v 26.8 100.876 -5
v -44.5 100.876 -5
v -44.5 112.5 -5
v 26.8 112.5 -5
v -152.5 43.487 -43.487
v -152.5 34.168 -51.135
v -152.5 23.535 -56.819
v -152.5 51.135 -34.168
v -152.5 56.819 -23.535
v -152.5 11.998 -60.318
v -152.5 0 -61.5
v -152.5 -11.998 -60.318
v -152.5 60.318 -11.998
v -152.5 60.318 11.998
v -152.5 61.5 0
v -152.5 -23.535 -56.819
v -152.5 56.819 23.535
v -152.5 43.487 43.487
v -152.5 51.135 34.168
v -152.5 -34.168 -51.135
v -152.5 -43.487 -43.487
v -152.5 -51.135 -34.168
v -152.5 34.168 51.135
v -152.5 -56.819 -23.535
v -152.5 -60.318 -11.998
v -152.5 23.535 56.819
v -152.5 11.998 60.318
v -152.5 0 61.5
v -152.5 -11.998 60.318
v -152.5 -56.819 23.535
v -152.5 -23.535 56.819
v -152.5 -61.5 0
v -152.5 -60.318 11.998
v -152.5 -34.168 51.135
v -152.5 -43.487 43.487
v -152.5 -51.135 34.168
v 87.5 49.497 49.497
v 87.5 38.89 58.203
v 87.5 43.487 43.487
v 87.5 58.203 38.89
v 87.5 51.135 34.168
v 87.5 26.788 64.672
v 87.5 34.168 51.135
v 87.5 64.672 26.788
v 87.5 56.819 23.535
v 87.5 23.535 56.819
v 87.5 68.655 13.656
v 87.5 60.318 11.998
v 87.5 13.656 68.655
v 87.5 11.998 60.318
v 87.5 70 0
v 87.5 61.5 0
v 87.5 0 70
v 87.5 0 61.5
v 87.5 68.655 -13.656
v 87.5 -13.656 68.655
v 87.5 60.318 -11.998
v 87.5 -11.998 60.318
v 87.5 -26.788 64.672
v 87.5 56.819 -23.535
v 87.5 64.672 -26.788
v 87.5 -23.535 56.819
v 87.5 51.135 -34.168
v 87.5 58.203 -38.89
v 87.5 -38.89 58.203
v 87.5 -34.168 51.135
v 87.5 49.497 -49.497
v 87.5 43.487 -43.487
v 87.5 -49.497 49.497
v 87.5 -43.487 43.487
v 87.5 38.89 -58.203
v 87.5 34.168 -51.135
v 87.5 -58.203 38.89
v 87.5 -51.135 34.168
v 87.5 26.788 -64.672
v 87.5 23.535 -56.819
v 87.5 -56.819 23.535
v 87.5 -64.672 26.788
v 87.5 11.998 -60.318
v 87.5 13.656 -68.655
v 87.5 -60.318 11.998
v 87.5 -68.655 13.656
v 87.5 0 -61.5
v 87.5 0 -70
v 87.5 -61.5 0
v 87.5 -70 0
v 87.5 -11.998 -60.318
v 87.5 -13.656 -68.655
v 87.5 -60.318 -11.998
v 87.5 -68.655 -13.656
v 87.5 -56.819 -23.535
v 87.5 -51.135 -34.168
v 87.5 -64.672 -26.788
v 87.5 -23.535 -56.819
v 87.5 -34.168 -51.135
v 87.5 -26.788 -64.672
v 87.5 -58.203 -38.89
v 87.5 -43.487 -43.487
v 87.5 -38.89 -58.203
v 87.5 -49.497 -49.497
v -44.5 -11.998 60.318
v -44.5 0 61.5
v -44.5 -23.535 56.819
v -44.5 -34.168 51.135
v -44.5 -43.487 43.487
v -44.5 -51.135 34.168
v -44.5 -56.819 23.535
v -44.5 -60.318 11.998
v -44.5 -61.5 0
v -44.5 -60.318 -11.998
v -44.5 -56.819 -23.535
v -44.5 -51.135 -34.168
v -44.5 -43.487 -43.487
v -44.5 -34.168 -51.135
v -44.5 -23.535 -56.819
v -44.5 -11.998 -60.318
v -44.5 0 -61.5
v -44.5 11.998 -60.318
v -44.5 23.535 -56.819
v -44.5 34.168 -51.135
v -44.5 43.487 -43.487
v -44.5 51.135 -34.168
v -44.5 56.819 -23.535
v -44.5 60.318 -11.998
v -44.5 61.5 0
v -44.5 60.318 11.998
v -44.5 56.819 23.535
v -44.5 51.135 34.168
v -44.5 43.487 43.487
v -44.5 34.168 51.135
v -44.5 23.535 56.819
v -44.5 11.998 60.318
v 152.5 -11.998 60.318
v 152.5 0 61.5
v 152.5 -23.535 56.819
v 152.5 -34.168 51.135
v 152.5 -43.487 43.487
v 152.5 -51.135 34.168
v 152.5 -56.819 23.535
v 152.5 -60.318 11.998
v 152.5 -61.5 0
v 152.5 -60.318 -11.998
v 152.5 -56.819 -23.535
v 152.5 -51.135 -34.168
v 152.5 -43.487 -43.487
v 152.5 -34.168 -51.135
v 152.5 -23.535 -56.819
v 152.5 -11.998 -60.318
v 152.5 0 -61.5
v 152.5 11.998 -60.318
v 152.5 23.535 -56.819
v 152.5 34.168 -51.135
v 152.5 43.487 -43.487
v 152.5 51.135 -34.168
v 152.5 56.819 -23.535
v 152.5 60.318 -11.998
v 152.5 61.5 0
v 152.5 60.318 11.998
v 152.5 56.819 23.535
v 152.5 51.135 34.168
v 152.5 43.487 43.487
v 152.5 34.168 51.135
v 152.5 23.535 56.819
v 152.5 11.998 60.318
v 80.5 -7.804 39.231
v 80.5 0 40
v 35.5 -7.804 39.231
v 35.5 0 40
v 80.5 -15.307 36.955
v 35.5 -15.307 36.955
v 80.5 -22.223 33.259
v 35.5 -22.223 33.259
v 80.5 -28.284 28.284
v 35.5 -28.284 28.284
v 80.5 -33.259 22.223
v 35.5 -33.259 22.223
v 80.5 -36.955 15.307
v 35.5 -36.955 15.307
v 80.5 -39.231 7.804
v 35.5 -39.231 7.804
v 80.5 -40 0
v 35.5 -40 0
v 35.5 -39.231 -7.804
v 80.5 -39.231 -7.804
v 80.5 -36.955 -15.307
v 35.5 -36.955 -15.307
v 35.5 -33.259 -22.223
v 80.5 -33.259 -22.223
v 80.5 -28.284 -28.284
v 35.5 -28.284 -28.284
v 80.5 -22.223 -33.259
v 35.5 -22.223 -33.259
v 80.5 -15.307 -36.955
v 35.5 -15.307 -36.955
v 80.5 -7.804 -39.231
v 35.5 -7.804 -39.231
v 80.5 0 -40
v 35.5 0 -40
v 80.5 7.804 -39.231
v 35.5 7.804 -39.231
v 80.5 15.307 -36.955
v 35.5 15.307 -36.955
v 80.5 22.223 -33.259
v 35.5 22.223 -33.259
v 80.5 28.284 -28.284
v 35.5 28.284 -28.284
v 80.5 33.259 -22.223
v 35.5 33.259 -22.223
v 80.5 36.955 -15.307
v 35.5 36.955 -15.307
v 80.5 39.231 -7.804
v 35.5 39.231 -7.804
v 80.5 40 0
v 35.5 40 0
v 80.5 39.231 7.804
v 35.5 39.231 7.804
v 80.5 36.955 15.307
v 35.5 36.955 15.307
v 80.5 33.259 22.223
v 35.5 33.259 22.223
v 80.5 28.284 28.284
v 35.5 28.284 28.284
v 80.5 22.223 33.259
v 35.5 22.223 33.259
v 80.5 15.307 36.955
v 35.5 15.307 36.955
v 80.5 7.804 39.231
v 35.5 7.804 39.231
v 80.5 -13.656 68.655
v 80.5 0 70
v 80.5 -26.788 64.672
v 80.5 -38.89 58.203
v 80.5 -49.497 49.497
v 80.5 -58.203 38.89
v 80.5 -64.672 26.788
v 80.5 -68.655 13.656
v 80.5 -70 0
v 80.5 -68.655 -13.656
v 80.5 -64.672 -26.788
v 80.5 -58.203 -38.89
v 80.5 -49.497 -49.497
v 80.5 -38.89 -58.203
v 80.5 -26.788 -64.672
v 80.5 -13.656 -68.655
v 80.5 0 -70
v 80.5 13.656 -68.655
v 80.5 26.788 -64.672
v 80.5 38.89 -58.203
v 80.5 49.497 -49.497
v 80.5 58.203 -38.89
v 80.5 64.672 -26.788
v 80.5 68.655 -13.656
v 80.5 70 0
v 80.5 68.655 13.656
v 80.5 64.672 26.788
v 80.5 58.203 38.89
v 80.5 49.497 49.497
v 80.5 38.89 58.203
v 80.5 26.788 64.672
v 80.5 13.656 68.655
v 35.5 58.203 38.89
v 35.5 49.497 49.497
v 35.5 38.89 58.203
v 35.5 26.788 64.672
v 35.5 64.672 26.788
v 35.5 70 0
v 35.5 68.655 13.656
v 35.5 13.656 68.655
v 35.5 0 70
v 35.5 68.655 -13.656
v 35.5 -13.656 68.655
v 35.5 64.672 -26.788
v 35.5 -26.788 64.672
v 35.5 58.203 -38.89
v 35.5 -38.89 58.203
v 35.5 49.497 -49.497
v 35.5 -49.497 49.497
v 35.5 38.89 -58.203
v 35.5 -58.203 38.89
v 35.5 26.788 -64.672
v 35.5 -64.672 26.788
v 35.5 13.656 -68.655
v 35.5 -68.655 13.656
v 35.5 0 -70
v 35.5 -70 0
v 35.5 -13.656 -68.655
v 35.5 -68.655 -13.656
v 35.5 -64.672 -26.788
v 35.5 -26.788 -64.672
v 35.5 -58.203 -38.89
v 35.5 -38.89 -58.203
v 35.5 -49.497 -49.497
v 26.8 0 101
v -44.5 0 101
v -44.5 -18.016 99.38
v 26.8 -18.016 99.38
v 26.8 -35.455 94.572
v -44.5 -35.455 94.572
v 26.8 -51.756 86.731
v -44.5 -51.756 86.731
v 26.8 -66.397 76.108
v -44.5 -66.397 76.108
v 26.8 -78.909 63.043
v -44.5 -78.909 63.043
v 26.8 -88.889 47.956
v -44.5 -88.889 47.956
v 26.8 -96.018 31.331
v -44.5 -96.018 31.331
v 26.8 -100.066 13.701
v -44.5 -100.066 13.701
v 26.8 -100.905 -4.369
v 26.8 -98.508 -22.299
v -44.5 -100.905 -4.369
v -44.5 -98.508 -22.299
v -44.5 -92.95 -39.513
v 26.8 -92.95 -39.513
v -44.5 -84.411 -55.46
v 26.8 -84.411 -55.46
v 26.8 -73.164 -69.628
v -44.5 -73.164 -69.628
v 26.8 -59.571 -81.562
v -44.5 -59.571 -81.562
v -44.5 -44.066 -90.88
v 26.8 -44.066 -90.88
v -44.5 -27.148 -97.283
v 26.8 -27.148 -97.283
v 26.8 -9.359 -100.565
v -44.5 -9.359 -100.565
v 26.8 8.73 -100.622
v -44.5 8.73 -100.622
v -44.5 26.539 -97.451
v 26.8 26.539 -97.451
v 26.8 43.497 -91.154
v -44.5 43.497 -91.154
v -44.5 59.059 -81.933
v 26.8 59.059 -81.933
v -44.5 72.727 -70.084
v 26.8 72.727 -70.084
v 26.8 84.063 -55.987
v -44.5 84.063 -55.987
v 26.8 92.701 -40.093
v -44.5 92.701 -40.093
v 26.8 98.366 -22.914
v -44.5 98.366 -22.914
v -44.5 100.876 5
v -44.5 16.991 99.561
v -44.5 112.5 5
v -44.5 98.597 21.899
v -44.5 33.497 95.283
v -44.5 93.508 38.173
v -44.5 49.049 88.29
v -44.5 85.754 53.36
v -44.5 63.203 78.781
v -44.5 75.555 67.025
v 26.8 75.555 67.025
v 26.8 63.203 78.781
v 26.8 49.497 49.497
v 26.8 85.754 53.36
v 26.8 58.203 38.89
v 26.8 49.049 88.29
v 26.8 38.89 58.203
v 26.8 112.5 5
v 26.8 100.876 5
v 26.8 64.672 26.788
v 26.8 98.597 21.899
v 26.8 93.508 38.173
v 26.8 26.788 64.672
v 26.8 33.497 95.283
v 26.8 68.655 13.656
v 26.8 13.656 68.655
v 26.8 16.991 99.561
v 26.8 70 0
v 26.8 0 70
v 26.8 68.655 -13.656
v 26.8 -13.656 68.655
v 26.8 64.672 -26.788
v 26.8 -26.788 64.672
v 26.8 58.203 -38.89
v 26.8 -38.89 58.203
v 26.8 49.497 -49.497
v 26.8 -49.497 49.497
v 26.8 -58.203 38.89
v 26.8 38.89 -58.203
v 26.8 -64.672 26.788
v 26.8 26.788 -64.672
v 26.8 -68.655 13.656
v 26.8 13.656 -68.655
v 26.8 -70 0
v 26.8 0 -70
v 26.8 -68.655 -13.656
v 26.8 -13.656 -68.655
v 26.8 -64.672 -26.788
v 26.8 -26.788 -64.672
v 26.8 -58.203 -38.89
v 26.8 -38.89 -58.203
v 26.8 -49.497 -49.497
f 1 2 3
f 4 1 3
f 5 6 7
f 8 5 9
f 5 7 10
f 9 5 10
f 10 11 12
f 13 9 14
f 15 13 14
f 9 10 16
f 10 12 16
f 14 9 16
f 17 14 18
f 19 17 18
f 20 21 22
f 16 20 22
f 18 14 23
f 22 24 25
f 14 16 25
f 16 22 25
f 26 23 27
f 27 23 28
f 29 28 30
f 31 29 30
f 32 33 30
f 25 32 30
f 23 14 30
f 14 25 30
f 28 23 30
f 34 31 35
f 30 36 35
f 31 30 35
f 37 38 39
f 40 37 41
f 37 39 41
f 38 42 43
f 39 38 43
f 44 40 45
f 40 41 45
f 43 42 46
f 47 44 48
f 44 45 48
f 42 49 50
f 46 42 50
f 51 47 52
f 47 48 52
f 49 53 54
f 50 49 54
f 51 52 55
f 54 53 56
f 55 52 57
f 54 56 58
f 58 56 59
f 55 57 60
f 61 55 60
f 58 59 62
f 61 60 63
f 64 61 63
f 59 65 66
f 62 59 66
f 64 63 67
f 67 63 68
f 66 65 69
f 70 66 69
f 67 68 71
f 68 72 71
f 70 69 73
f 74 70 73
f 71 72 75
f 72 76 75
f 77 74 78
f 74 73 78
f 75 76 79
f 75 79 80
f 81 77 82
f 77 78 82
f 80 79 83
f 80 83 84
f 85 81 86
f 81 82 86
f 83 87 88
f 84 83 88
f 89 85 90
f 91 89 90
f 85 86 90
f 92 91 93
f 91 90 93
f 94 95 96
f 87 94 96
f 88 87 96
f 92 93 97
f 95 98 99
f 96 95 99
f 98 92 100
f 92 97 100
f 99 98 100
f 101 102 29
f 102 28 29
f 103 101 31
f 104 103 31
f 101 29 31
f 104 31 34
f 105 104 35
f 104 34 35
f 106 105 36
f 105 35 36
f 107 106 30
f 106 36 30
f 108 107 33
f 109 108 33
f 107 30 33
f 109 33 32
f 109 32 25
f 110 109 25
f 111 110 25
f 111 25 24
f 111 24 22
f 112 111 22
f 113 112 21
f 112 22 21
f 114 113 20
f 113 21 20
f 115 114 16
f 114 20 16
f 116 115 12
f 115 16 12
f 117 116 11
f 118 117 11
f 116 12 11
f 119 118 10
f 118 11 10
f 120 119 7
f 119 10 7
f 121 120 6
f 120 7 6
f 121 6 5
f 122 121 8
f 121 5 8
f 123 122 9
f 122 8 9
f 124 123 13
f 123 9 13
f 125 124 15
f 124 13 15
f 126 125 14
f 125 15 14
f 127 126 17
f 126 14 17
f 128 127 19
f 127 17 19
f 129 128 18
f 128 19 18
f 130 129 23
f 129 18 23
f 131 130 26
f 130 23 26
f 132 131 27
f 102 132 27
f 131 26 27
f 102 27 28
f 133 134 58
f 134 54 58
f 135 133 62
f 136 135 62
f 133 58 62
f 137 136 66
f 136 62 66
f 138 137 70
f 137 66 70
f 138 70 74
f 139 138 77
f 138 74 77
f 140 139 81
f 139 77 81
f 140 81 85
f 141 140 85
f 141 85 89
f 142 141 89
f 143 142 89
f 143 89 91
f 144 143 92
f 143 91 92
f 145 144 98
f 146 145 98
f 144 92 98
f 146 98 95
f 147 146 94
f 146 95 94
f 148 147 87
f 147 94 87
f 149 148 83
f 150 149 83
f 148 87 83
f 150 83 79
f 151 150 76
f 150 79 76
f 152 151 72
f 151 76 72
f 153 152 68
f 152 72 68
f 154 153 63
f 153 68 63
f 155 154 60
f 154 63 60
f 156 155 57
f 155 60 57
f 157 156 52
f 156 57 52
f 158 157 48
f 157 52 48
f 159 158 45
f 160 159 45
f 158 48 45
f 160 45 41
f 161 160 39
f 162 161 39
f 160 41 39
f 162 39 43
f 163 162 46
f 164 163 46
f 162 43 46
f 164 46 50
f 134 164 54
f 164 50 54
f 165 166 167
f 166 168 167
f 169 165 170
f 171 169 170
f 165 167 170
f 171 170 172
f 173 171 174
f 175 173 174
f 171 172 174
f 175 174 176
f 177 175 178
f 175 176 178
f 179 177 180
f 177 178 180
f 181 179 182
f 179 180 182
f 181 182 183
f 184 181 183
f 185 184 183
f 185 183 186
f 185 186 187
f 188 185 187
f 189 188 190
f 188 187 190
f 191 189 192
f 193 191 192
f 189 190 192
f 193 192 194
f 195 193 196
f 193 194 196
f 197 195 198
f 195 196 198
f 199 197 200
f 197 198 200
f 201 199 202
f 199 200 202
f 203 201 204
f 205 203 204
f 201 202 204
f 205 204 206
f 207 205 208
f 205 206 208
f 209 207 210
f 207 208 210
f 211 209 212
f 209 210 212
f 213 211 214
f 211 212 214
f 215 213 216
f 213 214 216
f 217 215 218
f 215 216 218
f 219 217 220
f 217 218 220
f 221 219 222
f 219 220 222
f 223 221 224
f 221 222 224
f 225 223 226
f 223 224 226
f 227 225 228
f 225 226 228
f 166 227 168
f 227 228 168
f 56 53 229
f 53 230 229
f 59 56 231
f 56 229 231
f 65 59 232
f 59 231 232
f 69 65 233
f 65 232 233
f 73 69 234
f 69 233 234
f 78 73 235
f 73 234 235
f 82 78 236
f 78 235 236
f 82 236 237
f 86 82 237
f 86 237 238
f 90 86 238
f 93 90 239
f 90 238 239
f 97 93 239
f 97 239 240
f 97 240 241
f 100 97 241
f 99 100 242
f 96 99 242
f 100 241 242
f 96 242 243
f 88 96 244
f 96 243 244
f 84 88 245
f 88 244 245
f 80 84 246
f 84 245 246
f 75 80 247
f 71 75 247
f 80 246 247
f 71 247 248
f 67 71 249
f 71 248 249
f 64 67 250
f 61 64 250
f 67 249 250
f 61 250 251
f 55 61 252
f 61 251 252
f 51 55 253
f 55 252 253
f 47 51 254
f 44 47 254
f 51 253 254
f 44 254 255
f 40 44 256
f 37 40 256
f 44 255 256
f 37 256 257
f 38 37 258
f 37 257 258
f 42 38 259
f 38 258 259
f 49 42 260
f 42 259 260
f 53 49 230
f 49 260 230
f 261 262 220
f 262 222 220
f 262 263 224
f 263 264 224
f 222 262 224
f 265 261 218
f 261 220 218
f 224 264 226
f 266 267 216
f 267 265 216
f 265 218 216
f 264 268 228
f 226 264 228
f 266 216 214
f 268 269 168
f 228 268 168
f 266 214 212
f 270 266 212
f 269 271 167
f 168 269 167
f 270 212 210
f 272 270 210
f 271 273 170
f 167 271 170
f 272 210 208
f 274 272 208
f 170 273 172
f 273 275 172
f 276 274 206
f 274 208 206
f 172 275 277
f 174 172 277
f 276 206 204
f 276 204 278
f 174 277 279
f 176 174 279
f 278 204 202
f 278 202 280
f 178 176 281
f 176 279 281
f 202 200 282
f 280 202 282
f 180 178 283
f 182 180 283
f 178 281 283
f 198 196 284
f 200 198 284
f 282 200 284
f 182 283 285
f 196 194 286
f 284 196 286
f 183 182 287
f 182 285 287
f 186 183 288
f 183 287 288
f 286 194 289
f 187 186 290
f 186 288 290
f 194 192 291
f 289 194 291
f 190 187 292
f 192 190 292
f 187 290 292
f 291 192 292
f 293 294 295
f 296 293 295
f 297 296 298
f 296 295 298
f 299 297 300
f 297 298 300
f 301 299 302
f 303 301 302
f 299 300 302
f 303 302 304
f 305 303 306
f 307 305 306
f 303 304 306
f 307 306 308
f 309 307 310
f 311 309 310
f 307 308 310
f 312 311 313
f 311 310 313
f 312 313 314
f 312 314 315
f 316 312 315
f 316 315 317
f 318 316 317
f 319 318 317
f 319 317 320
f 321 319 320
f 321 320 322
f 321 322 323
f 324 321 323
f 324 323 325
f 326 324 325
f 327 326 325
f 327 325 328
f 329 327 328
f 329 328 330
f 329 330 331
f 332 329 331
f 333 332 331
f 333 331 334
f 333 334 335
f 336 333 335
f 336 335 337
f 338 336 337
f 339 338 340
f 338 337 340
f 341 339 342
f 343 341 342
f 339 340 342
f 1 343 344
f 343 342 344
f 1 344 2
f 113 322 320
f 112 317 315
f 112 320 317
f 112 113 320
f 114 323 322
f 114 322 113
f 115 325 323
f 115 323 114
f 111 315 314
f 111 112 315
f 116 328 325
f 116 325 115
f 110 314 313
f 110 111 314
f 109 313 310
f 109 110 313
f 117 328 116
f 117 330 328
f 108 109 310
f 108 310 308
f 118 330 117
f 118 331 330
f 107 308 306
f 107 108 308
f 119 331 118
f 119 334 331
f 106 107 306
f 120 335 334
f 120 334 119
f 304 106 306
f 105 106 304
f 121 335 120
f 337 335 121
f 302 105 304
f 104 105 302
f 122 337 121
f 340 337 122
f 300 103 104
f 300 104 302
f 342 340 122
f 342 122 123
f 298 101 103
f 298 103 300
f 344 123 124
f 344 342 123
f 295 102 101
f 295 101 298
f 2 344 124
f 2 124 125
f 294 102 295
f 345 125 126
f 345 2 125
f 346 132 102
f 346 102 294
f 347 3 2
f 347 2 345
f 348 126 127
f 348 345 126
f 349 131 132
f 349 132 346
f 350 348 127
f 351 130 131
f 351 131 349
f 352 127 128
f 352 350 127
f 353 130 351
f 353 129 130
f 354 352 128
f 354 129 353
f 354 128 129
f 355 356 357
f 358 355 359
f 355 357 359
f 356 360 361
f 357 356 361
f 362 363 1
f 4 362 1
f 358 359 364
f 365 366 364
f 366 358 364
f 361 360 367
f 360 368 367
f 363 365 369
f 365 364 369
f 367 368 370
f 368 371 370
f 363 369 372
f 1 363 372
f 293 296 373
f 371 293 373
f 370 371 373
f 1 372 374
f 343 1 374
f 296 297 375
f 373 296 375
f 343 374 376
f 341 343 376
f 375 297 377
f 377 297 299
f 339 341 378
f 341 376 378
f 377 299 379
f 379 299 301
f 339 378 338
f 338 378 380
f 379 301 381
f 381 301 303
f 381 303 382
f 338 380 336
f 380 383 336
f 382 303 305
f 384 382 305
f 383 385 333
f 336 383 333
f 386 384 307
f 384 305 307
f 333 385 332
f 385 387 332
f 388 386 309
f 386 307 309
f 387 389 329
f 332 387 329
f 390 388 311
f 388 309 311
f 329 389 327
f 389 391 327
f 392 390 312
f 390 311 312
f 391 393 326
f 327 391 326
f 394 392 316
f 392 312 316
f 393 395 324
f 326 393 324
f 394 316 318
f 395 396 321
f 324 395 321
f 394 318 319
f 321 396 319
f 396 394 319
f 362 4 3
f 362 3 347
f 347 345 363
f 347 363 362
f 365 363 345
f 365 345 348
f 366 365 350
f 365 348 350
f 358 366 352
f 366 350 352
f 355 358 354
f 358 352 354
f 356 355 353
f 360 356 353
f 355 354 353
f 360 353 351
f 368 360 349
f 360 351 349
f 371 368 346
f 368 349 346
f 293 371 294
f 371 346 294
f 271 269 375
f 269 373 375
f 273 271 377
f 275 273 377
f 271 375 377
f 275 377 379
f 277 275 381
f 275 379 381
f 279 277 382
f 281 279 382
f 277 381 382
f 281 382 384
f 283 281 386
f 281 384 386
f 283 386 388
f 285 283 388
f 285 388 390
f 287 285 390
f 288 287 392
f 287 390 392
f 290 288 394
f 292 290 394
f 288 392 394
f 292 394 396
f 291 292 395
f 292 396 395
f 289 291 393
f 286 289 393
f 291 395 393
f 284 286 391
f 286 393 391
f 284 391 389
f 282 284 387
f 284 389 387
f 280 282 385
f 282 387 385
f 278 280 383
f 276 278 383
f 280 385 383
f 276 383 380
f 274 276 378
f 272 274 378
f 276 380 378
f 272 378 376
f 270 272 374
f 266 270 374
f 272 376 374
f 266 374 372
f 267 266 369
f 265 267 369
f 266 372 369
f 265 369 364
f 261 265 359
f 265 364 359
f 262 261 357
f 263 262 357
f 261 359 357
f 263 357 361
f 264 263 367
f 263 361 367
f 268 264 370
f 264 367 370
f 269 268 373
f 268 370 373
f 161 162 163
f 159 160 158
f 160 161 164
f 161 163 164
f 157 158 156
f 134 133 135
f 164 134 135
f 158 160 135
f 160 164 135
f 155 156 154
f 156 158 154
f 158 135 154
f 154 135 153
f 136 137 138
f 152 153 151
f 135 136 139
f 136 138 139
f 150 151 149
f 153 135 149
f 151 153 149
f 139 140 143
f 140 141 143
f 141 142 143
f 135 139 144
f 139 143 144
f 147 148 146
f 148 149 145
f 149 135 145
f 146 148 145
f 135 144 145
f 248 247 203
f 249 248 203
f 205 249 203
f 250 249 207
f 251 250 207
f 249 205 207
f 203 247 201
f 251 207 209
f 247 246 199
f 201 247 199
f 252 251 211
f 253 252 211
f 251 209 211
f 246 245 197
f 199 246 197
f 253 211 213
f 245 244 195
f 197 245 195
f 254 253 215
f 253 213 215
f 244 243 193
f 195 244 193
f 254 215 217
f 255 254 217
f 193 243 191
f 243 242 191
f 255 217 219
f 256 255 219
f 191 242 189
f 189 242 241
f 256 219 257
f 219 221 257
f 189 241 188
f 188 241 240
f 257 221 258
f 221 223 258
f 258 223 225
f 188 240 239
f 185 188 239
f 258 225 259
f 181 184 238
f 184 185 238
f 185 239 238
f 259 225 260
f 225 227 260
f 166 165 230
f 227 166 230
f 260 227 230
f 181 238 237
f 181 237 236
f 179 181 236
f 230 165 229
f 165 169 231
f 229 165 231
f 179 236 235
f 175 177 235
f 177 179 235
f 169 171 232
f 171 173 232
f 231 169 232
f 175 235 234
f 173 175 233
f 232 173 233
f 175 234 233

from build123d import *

# Parameters (mm, degrees)
SCHIZZO2_W                   = 10
SCHIZZO2_H                   = 35
ESTRUSIONE_ESTRUSIONE1_DEPTH = 71.3


with BuildPart() as part:
    # Schizzo1 → Rivoluzione1 (revolve)
    with BuildSketch(Plane.XY, mode=Mode.PRIVATE) as rivoluzione1_sk:
        Polygon((-152.5, 0), (152.5, 0), (152.5, 61.5), (87.5, 61.5), (87.5, 70), (80.5, 70), (80.5, 40), (35.5, 40), (35.5, 70), (26.8, 70), (26.8, 101), (-44.5, 101), (-44.5, 61.5), (-152.5, 61.5), align=None)
    revolve(rivoluzione1_sk.sketch.rotate(Axis((-1716.324322208, 0, 0), (1, 0, 0)), 90), axis=Axis((-1716.324322208, 0, 0), (1, 0, 0)))

    # Schizzo2 → Estrusione-Estrusione1 (add)
    with BuildSketch(Plane.ZY.offset(44.5)):
        with Locations((0, 95)):
            Rectangle(SCHIZZO2_W, SCHIZZO2_H)
    extrude(amount=-ESTRUSIONE_ESTRUSIONE1_DEPTH)


solid = part.part
